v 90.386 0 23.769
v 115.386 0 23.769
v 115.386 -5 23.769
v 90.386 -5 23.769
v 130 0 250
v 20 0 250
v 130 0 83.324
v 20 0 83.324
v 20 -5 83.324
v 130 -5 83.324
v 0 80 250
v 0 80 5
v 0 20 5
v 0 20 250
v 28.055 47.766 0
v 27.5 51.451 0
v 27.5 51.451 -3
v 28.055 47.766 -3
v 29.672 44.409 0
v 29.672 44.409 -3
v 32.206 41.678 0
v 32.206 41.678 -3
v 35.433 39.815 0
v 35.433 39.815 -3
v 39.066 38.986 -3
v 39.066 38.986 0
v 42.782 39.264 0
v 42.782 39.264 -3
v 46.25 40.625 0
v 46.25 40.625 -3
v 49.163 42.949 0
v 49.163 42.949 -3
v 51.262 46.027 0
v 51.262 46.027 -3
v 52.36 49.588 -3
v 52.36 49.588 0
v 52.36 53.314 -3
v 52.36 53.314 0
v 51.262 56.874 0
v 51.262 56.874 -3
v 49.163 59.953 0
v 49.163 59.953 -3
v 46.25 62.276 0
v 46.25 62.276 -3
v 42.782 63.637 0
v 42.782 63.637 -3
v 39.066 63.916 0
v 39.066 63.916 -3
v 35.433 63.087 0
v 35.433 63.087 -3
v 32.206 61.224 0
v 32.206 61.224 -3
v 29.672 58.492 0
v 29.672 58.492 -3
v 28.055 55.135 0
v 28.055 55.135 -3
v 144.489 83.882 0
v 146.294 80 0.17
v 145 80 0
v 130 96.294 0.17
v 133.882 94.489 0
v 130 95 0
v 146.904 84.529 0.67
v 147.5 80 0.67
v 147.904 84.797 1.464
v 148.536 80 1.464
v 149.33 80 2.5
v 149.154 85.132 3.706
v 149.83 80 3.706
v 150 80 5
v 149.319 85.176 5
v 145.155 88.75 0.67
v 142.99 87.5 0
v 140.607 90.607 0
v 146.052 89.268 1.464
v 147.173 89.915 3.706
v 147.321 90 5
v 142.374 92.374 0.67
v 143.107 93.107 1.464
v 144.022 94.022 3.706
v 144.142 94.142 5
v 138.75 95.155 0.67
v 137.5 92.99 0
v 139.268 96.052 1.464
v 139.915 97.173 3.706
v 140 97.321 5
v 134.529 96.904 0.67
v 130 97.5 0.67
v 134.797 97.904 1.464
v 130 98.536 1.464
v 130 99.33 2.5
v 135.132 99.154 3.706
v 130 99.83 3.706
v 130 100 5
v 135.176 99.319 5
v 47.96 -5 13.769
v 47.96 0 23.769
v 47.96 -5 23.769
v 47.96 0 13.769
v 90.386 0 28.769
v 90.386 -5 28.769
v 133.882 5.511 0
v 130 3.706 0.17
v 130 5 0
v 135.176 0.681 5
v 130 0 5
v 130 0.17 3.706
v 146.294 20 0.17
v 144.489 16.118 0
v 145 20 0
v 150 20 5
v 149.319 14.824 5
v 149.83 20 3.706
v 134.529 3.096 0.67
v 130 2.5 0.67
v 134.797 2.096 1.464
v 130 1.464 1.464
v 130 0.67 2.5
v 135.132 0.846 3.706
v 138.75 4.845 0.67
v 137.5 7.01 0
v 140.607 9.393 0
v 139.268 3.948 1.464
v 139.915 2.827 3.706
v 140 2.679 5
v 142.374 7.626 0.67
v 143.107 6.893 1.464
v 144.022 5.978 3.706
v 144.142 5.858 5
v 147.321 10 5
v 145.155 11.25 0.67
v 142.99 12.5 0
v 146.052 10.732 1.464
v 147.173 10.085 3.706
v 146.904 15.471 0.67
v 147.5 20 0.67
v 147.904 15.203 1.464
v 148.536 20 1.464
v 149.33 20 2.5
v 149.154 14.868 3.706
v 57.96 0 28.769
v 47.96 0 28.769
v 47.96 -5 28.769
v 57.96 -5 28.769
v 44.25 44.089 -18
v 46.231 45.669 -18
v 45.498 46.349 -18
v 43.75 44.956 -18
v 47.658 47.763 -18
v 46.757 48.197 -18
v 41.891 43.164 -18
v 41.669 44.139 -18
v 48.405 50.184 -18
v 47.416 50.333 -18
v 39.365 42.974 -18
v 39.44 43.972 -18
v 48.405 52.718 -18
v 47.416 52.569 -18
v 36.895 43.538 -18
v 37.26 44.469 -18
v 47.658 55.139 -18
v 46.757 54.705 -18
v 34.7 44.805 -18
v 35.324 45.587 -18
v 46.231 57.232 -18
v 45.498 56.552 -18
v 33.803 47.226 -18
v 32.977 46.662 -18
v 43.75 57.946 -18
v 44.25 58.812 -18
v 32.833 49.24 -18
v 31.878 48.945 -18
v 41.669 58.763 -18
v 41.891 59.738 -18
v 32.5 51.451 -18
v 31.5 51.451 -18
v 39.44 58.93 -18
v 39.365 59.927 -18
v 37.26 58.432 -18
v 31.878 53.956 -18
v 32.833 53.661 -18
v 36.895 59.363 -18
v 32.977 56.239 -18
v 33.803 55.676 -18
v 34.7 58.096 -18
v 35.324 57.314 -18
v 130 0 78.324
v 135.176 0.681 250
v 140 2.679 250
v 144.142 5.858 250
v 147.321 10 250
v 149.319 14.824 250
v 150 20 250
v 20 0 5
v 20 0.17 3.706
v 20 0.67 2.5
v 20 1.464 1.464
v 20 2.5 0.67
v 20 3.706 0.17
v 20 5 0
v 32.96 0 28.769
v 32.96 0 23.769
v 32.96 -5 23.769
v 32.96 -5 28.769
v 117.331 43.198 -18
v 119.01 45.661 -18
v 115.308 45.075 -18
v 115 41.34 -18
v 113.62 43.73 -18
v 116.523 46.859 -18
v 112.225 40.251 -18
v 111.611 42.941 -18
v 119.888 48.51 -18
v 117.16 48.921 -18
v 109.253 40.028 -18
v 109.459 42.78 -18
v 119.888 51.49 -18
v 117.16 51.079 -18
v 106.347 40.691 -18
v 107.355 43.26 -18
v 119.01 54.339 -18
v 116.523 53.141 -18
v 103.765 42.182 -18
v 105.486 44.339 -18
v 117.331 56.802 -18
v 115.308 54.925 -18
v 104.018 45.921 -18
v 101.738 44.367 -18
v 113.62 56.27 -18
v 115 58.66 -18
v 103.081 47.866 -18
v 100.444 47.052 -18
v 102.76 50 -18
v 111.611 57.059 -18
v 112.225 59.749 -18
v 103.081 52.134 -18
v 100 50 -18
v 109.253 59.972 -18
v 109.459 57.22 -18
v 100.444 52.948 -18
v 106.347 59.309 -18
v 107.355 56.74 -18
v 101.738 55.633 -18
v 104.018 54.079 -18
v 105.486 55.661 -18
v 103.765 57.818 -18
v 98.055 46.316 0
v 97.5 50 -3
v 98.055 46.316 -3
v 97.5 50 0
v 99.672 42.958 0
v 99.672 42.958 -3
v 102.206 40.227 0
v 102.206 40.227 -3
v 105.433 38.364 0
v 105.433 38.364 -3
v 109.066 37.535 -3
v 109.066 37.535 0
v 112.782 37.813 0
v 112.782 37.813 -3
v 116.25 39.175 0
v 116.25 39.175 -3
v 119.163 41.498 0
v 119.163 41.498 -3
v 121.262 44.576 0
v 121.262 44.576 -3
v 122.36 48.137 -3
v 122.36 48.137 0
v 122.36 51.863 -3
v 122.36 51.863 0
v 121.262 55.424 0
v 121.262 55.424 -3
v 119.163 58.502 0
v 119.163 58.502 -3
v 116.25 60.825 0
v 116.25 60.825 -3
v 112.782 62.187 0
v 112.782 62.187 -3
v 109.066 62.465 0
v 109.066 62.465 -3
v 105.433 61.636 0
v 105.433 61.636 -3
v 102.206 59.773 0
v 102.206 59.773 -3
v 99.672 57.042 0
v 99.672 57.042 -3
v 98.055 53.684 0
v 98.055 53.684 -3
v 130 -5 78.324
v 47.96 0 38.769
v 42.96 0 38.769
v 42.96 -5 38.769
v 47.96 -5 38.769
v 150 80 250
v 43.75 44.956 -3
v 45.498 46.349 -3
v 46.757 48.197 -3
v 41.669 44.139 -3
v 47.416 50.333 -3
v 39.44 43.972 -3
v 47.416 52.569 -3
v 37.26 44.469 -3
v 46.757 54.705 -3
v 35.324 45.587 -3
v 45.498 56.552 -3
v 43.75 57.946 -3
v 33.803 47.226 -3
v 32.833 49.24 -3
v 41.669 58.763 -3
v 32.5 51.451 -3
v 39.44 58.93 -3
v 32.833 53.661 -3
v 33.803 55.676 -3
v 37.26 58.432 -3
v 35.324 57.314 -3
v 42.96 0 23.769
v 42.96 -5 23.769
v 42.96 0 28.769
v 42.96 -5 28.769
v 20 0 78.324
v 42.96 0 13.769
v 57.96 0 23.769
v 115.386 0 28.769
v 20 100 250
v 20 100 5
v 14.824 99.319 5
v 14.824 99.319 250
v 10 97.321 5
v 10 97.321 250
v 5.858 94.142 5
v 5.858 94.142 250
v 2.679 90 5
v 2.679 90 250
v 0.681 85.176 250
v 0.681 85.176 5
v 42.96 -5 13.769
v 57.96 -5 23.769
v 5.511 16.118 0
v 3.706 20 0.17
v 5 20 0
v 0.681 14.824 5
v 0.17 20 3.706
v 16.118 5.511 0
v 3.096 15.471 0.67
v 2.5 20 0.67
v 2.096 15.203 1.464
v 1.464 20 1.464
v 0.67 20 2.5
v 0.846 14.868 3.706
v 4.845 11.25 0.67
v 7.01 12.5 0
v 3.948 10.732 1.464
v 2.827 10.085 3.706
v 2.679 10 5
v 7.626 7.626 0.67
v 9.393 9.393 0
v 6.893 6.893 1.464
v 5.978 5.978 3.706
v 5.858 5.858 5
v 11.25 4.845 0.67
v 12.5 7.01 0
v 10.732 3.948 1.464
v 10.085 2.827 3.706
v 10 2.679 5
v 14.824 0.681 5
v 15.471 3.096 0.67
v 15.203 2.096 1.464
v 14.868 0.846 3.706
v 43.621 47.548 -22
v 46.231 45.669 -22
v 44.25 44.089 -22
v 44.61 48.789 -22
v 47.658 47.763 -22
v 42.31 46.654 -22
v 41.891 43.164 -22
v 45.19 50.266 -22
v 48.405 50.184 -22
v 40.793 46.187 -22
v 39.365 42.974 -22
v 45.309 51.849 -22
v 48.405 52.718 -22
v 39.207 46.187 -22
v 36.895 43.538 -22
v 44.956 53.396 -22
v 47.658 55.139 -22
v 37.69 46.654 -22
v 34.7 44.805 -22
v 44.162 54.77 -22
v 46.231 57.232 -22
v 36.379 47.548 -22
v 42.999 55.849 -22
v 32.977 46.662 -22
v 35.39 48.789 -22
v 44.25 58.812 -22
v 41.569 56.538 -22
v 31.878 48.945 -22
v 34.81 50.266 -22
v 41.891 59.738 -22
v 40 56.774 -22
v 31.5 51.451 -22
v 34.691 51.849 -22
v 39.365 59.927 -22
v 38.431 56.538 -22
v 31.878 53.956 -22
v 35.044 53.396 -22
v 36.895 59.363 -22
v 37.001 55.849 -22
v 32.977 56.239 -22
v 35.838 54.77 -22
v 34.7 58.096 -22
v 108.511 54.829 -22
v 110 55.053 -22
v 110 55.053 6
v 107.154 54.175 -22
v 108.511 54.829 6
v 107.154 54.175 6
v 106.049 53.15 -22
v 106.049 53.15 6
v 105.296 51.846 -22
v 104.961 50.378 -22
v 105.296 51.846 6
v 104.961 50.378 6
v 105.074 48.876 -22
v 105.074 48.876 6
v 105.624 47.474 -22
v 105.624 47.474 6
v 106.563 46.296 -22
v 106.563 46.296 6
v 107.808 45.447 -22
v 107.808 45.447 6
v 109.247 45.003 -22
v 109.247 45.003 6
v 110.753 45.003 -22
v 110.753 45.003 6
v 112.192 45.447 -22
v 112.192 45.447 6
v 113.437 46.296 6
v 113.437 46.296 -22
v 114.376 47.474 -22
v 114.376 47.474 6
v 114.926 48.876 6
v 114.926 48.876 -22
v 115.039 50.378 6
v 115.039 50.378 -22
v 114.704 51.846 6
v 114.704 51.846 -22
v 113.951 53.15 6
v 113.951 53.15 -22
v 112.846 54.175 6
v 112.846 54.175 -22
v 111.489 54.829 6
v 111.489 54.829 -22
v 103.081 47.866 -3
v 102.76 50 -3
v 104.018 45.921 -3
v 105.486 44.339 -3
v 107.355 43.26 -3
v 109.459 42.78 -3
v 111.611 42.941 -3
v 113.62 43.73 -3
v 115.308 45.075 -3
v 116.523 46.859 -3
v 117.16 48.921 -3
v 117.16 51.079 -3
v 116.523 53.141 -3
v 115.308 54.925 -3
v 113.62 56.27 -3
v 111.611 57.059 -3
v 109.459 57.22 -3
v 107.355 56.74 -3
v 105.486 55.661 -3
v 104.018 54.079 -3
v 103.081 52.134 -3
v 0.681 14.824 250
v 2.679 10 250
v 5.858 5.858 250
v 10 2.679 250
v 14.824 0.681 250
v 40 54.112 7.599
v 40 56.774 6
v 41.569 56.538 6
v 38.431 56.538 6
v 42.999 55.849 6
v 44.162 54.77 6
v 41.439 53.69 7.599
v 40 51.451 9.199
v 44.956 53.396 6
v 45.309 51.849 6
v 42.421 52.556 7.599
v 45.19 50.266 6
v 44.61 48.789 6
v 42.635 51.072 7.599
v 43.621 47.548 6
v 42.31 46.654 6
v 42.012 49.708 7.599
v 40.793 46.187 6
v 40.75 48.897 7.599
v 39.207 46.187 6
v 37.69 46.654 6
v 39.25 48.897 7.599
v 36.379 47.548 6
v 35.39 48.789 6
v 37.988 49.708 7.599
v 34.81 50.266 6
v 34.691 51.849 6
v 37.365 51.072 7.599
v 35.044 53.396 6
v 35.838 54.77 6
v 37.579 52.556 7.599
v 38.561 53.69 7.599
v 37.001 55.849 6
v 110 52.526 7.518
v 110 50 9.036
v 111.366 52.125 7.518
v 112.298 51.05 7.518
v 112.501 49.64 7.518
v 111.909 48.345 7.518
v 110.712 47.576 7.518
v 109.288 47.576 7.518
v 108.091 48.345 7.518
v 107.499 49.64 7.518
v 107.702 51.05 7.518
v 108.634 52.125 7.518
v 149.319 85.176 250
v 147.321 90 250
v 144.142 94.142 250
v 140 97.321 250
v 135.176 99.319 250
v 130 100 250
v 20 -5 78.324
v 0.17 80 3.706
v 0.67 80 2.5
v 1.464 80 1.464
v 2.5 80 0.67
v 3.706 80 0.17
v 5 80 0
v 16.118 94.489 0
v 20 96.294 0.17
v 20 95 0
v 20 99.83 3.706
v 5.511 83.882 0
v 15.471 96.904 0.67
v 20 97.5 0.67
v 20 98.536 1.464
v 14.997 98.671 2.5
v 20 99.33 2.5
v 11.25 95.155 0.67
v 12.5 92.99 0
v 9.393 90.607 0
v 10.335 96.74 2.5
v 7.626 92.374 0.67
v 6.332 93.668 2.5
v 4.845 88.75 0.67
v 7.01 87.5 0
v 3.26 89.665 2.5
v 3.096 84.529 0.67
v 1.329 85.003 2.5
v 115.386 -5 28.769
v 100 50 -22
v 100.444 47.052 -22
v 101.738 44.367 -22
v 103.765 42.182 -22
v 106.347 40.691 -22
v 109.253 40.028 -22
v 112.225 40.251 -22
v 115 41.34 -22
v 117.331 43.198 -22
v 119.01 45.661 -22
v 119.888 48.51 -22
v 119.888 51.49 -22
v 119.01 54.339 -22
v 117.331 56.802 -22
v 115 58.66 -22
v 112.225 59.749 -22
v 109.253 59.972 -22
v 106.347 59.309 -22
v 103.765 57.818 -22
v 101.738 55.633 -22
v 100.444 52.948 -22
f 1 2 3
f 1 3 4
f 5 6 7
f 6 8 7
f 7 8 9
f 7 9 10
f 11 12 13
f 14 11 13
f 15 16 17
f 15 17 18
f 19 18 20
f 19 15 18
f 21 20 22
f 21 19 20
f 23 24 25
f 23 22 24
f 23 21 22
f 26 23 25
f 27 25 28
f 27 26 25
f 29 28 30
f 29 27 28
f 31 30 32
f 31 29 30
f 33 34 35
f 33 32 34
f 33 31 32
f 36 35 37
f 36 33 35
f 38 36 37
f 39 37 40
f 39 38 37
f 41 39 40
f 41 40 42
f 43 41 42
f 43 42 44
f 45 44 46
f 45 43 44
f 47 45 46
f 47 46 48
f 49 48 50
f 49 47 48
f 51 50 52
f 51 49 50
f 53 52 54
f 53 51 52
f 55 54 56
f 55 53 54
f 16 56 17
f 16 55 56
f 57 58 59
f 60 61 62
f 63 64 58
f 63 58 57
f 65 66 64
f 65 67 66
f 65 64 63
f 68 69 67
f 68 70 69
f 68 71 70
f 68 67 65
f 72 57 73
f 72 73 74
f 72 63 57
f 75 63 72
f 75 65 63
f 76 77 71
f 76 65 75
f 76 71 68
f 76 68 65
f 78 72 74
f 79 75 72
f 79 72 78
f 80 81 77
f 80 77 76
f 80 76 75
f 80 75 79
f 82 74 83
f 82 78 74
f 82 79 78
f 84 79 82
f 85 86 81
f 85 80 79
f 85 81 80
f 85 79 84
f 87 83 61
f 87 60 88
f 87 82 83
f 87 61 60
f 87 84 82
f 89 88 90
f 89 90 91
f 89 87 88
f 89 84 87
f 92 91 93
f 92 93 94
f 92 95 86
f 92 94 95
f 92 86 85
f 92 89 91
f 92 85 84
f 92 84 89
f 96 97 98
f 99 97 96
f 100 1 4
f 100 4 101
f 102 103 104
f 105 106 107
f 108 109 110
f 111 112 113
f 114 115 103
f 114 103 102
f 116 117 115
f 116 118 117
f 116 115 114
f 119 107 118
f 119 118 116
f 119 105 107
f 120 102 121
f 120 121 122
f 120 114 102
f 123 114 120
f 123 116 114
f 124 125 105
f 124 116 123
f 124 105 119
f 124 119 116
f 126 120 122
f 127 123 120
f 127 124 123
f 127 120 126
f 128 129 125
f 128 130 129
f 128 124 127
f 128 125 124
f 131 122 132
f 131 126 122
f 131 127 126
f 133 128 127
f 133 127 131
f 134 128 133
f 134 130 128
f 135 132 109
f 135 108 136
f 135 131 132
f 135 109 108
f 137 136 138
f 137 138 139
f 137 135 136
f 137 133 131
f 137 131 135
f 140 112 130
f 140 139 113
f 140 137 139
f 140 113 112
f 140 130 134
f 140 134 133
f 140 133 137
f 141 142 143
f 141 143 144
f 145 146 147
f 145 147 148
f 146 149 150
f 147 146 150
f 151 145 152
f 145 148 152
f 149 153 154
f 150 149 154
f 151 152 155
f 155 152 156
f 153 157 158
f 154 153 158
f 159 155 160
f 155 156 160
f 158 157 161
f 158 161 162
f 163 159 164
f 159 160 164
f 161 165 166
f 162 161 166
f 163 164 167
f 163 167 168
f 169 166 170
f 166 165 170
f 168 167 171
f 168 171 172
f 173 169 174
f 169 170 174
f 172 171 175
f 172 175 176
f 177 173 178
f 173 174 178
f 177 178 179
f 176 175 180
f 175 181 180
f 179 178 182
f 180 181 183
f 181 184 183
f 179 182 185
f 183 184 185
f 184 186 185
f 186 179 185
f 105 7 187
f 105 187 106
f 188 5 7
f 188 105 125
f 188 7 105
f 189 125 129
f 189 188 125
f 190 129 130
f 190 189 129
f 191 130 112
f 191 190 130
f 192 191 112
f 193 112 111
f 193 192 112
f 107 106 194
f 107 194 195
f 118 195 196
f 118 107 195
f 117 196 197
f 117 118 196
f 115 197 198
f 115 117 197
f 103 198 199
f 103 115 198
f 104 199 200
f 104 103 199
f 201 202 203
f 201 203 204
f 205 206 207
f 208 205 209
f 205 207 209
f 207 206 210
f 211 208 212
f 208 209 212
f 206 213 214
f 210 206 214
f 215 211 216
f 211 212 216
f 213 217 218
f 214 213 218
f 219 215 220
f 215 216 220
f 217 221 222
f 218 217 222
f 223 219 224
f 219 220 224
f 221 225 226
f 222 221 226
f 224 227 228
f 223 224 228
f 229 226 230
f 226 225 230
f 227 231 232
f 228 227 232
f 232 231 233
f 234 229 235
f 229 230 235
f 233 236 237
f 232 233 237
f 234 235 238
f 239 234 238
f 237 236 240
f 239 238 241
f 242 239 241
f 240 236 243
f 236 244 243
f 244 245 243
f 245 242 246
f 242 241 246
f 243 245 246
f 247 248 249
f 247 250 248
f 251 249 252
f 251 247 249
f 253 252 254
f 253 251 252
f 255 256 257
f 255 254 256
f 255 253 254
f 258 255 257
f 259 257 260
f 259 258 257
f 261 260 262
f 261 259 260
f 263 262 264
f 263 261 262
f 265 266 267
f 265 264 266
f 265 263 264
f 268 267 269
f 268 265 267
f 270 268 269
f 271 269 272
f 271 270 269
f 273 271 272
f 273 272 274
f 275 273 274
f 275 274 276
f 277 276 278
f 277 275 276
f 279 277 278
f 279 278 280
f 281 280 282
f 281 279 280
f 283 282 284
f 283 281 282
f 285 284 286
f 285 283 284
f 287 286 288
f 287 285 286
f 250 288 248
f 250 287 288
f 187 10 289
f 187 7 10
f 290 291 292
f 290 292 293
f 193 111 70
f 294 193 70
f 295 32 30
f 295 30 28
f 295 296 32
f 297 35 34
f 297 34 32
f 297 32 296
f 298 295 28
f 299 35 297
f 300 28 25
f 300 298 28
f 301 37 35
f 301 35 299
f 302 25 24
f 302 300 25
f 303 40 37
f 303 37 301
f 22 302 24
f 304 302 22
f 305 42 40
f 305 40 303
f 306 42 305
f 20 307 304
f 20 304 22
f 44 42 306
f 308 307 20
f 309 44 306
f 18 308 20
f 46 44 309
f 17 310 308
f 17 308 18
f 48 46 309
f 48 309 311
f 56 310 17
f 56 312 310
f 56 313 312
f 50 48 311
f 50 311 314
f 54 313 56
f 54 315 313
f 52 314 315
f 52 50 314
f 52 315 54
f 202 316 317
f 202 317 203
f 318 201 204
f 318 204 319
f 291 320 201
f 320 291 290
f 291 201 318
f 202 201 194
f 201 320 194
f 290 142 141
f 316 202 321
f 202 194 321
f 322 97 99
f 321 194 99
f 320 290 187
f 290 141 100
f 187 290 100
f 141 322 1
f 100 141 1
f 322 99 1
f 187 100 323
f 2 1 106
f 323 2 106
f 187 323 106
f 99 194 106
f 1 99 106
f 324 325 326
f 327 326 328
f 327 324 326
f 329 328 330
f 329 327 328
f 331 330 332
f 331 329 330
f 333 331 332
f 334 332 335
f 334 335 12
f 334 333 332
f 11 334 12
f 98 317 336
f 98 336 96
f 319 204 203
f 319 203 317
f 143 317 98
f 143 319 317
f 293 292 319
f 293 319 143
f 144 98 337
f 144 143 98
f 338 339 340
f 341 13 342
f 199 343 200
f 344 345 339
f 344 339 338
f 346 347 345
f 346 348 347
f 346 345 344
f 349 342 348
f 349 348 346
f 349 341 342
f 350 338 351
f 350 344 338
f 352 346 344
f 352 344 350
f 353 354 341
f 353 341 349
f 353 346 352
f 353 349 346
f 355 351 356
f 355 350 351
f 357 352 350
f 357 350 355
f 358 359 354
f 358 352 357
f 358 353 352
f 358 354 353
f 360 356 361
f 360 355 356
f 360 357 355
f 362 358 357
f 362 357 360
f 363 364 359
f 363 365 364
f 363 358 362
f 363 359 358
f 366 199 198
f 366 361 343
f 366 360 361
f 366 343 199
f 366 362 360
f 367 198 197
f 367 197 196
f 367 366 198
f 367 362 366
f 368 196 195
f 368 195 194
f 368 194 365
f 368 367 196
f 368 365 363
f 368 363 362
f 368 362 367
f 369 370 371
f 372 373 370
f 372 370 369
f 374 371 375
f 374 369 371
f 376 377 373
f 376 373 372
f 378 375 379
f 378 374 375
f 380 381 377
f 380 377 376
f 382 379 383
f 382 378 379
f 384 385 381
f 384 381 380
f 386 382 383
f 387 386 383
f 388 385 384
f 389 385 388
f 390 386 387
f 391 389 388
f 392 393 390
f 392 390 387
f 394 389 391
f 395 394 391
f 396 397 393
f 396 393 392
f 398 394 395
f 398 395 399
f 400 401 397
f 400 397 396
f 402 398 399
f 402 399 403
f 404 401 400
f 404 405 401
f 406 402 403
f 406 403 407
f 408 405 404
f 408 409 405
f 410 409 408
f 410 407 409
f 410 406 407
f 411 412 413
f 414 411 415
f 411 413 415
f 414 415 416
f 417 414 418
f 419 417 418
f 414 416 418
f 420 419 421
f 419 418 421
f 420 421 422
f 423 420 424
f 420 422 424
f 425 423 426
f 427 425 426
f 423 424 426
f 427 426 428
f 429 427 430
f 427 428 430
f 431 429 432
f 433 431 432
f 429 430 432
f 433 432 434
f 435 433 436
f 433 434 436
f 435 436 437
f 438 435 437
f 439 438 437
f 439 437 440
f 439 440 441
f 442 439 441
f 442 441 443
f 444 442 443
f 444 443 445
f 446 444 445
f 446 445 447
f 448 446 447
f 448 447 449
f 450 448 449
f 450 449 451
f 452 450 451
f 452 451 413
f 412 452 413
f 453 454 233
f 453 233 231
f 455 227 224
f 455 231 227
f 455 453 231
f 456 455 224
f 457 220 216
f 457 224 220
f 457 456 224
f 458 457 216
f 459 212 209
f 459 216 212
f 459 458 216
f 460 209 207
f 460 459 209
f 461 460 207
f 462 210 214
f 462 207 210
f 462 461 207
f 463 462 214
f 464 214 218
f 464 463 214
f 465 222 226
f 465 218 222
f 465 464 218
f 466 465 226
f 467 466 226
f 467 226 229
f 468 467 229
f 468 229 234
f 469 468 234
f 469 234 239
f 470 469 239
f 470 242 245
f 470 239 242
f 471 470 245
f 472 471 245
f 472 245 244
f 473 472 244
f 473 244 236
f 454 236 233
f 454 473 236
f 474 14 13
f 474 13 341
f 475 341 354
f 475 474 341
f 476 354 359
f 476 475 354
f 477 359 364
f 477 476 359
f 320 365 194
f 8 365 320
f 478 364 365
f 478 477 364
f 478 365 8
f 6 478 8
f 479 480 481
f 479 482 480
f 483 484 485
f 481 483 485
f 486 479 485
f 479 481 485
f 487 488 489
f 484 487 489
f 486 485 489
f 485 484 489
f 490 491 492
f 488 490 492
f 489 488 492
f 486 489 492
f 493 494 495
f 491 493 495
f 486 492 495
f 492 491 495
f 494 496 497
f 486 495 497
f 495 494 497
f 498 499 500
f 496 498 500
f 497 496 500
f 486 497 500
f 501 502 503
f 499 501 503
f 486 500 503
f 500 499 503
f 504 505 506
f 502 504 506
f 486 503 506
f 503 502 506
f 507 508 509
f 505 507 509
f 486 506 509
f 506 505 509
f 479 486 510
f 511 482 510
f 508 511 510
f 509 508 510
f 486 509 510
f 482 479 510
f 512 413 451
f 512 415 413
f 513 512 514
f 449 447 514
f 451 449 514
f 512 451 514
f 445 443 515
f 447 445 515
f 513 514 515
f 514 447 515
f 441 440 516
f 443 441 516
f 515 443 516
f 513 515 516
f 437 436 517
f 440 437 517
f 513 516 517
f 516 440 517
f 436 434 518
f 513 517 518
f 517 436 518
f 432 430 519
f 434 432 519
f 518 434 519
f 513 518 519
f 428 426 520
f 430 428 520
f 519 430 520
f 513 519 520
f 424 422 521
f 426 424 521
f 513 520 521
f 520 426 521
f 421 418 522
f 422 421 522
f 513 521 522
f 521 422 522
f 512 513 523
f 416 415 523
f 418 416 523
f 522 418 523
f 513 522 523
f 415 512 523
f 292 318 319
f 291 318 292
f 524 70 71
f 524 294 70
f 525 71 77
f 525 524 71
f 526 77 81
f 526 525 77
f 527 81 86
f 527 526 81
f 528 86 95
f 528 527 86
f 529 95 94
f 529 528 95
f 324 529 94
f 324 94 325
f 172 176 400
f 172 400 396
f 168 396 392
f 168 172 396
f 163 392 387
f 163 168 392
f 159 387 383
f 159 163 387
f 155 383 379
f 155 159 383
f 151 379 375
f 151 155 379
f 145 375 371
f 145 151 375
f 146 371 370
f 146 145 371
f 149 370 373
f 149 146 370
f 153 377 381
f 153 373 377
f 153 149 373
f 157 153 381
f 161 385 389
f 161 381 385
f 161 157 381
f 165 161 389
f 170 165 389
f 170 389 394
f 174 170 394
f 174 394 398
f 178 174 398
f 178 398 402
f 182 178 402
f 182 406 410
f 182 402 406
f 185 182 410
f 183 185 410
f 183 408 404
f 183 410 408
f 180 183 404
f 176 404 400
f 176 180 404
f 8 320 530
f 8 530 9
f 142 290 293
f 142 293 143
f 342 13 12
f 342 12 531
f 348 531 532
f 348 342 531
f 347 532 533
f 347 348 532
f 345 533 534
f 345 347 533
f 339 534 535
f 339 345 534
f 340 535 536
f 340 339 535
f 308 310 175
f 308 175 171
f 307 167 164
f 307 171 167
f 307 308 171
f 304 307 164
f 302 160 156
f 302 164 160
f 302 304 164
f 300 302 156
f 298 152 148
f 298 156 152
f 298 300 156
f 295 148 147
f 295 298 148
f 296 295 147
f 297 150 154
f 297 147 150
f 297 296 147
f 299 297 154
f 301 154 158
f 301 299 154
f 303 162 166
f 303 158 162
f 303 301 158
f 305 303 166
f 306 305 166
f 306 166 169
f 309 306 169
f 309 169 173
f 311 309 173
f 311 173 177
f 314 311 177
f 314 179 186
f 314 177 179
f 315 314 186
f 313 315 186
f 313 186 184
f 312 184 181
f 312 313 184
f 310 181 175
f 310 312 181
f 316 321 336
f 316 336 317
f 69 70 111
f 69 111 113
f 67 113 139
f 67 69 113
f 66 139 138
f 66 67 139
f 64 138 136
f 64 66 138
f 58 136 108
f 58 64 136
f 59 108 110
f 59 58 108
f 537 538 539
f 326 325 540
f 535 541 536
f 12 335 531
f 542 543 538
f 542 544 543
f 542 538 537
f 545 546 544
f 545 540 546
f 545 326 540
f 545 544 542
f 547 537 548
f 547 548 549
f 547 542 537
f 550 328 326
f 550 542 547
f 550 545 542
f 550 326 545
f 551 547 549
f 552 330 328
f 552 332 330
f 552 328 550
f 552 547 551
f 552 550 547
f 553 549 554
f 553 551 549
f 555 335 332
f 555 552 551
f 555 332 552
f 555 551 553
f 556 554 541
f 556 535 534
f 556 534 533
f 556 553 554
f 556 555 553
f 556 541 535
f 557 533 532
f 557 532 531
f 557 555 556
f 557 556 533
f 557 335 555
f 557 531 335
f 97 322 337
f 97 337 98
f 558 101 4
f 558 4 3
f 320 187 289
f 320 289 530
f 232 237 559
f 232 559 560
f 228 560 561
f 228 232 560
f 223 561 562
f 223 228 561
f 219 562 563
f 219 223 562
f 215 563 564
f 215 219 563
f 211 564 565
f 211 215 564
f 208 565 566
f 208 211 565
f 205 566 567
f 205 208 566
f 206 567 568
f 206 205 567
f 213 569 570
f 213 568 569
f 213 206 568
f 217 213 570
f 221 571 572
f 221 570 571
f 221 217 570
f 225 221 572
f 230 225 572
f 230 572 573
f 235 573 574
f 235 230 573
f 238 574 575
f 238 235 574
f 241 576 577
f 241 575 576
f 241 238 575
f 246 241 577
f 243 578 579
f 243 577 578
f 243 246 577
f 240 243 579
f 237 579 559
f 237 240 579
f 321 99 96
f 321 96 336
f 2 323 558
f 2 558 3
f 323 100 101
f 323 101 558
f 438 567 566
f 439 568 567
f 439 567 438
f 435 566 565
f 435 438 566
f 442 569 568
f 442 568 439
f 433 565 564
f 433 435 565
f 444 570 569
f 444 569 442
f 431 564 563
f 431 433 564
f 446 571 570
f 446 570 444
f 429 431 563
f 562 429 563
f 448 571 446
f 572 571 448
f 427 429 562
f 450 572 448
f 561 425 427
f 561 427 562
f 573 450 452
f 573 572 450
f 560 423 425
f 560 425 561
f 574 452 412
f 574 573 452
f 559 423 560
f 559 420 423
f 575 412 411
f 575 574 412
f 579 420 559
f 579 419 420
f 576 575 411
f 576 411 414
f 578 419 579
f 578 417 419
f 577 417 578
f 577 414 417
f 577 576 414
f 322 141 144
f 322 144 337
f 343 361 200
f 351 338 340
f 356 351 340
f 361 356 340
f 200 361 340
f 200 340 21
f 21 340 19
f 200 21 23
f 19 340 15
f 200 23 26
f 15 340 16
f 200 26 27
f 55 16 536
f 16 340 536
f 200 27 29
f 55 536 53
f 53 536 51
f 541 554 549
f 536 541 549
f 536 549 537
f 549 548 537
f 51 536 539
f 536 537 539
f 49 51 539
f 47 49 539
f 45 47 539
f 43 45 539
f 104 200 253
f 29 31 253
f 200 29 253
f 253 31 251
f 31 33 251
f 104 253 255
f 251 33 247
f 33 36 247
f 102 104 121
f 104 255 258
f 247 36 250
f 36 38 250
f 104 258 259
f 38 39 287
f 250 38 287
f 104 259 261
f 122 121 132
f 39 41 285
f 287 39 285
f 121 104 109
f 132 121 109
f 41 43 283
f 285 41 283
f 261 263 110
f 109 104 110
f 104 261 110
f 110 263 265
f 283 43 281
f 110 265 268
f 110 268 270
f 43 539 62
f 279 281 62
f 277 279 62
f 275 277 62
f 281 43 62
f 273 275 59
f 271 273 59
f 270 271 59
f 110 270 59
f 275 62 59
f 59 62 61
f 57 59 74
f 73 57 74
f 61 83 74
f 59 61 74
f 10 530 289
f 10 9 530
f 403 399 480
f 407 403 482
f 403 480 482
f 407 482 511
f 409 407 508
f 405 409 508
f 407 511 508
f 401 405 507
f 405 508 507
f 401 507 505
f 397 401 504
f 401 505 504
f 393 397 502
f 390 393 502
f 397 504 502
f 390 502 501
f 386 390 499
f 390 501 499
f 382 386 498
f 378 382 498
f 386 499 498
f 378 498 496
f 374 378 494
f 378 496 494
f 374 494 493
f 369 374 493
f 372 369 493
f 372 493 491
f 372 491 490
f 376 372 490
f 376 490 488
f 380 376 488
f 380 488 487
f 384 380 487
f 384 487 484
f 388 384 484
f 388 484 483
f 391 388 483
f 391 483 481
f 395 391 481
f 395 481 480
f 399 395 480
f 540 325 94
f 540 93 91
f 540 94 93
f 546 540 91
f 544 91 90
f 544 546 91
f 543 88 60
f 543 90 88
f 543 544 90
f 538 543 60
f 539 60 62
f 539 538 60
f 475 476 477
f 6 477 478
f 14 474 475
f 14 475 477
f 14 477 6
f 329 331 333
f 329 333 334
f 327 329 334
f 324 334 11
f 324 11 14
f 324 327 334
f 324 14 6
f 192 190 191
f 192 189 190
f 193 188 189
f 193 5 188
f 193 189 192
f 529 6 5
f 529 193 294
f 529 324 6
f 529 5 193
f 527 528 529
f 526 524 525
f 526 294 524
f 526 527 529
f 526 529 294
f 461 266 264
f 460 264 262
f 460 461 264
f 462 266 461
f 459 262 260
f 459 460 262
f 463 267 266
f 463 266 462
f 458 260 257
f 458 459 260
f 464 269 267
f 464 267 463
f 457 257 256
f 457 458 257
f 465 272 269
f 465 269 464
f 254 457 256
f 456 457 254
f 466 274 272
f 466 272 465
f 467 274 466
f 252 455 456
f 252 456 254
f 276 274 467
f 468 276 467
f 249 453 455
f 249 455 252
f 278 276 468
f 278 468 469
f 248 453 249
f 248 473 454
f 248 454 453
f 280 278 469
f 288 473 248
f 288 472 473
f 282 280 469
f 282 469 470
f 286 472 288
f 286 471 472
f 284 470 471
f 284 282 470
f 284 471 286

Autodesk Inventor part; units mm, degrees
ref_plane "YZ Plane" through (0, 0, 0) normal (1, 0, 0) x (0, 1, 0)
ref_plane "XZ Plane" through (0, 0, 0) normal (0, 1, 0) x (-1, 0, 0)
ref_plane "XY Plane" through (0, 0, 0) normal (0, 0, 1) x (1, 0, 0)
sketch "Sketch1" plane through (0, 0, 0) normal (0, 0, 1) x (1, 0, 0)
  line L0 (0, 0) -> (150, 0)
  line L1 (150, 0) -> (150, 100)
  line L2 (150, 100) -> (0, 100)
  line L3 (0, 100) -> (0, 0)
  dimension "d0" = 150
  dimension "d1" = 100
extrude "Extrusion1" add sketch "Sketch1" along normal blind 250
fillet "Fillet1" radius 20 1 edges at (150, 100, 125)
fillet "Fillet2" radius 20 1 edges at (150, 0, 125)
fillet "Fillet3" radius 20 1 edges at (0, 100, 125)
fillet "Fillet4" radius 20 1 edges at (0, 0, 125)
fillet "Fillet5" radius 5 8 edges at (5.8579, 94.1421, 0) (0, 50, 0) (5.8579, 5.8579, 0) (75, 0, 0) (144.1421, 5.8579, 0) (150, 50, 0) (144.1421, 94.1421, 0) (75, 100, 0)
sketch "Sketch2" plane through (20, 0, 250) normal (0, -1, 0) x (1, 0, 0)
  line L0 (110, 0) -> (110, -245) projected
  line L1 (0, -245) -> (0, 0) projected
  line L2 (110, -171.6757) -> (0, -171.6757)
  line L3 (0, -171.6757) -> (0, -166.6757)
  line L4 (0, -166.6757) -> (110, -166.6757)
  line L5 (110, -166.6757) -> (110, -171.6757)
  line L6 (95.3863, -226.2308) -> (70.3863, -226.2308)
  line L7 (70.3863, -226.2308) -> (70.3863, -221.2308)
  line L8 (70.3863, -221.2308) -> (95.3863, -221.2308)
  line L9 (95.3863, -221.2308) -> (95.3863, -226.2308)
  line L10 (37.9599, -226.2308) -> (12.9599, -226.2308)
  line L11 (12.9599, -226.2308) -> (12.9599, -221.2308)
  line L12 (12.9599, -221.2308) -> (37.9599, -221.2308)
  line L13 (37.9599, -221.2308) -> (37.9599, -226.2308)
  line L14 (27.9599, -236.2308) -> (22.9599, -236.2308)
  line L15 (22.9599, -236.2308) -> (22.9599, -211.2308)
  line L16 (22.9599, -211.2308) -> (27.9599, -211.2308)
  line L17 (27.9599, -211.2308) -> (27.9599, -236.2308)
  point P0 (-20, -250)
  point P1 (27.9599, -226.2308)
  point P2 (27.9599, -221.2308)
  point P3 (22.9599, -221.2308)
  point P4 (22.9599, -226.2308)
  dimension "d9" = 25
  dimension "d10" = 5
  dimension "d11" = 5
  dimension "d12" = 25
  dimension "d13" = 10
  dimension "d14" = 10
  dimension "d15" = 5
  dimension "d16" = 25
  dimension "d17" = 5
extrude "Extrusion2" add sketch "Sketch2" along normal blind 5
sketch "Sketch3" plane through (0, 0, 0) normal (0, 0, -1) x (-1, 0, 0)
  line L0 (-20, 100) -> (-130, 100) projected
  line L1 (-150, 80) -> (-150, 20) projected
  circle A0 centre (-110, 50) radius 12.5
  circle A1 centre (-40, 51.4507) radius 12.5
  point P0 (0, 0)
  point P1 (-150, 50)
  dimension "d20" = 50
  dimension "d21" = 40
  dimension "d22" = 70
  dimension "d23" = 25
  dimension "d24" = 25
extrude "Extrusion3" add sketch "Sketch3" along normal blind 3
sketch "Sketch4" plane through (110, 50, -3) normal (0, 0, -1) x (-1, 0, 0)
  circle A0 centre (0, 0) radius 7.2404
  circle A1 centre (70, 1.4507) radius 12.5 projected
  circle A2 centre (70, 1.4507) radius 7.5
  point P0 (110, -50)
  dimension "d27" = 15
extrude "Extrusion4" add sketch "Sketch4" along normal blind 15 contours A0 | A2
sketch "Sketch5" plane through (110, 50, -18) normal (0, 0, -1) x (-1, 0, 0)
  circle A0 centre (0, 0) radius 7.2404 projected
  circle A1 centre (0, 0) radius 10
  circle A2 centre (70, 1.4507) radius 7.5 projected
  circle A3 centre (70, 1.4507) radius 8.5
  point P0 (110, -50)
  dimension "d30" = 20
  dimension "d31" = 17
extrude "Extrusion5" add sketch "Sketch5" along normal blind 4 contours A0 | A1 | A2 | A3
sketch "Sketch6" plane through (110, 50, -22) normal (0, 0, -1) x (-1, 0, 0)
  circle A0 centre (0, 0) radius 10 projected
  point P0 (110, -50)
hole "Hole1" at (110, 50, -22) direction (0, 0, 1) diameter 10.106 depth 28 tip angle 118 thread size "M12x1.75" class "6H" standard "ISO Metric profile"
sketch "Sketch7" plane through (40, 51.4507, -22) normal (0, 0, -1) x (-1, 0, 0)
  circle A0 centre (0, 0) radius 8.5 projected
  point P0 (40, -51.4507)
hole "Hole2" at (40, 51.4507, -22) direction (0, 0, 1) diameter 10.647 depth 28 tip angle 118 thread size "M12x1.25" class "6H" standard "ISO Metric profile"
properties part number "battery eg 26"
